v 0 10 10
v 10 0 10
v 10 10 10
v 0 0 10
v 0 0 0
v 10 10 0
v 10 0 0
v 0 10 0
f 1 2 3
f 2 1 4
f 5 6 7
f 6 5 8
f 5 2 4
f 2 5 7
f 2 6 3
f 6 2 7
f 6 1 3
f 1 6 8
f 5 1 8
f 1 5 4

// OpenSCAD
//error.scad
a=10;   // syntax error
b=2;

module errmod() { cube(a); }

errmod();
